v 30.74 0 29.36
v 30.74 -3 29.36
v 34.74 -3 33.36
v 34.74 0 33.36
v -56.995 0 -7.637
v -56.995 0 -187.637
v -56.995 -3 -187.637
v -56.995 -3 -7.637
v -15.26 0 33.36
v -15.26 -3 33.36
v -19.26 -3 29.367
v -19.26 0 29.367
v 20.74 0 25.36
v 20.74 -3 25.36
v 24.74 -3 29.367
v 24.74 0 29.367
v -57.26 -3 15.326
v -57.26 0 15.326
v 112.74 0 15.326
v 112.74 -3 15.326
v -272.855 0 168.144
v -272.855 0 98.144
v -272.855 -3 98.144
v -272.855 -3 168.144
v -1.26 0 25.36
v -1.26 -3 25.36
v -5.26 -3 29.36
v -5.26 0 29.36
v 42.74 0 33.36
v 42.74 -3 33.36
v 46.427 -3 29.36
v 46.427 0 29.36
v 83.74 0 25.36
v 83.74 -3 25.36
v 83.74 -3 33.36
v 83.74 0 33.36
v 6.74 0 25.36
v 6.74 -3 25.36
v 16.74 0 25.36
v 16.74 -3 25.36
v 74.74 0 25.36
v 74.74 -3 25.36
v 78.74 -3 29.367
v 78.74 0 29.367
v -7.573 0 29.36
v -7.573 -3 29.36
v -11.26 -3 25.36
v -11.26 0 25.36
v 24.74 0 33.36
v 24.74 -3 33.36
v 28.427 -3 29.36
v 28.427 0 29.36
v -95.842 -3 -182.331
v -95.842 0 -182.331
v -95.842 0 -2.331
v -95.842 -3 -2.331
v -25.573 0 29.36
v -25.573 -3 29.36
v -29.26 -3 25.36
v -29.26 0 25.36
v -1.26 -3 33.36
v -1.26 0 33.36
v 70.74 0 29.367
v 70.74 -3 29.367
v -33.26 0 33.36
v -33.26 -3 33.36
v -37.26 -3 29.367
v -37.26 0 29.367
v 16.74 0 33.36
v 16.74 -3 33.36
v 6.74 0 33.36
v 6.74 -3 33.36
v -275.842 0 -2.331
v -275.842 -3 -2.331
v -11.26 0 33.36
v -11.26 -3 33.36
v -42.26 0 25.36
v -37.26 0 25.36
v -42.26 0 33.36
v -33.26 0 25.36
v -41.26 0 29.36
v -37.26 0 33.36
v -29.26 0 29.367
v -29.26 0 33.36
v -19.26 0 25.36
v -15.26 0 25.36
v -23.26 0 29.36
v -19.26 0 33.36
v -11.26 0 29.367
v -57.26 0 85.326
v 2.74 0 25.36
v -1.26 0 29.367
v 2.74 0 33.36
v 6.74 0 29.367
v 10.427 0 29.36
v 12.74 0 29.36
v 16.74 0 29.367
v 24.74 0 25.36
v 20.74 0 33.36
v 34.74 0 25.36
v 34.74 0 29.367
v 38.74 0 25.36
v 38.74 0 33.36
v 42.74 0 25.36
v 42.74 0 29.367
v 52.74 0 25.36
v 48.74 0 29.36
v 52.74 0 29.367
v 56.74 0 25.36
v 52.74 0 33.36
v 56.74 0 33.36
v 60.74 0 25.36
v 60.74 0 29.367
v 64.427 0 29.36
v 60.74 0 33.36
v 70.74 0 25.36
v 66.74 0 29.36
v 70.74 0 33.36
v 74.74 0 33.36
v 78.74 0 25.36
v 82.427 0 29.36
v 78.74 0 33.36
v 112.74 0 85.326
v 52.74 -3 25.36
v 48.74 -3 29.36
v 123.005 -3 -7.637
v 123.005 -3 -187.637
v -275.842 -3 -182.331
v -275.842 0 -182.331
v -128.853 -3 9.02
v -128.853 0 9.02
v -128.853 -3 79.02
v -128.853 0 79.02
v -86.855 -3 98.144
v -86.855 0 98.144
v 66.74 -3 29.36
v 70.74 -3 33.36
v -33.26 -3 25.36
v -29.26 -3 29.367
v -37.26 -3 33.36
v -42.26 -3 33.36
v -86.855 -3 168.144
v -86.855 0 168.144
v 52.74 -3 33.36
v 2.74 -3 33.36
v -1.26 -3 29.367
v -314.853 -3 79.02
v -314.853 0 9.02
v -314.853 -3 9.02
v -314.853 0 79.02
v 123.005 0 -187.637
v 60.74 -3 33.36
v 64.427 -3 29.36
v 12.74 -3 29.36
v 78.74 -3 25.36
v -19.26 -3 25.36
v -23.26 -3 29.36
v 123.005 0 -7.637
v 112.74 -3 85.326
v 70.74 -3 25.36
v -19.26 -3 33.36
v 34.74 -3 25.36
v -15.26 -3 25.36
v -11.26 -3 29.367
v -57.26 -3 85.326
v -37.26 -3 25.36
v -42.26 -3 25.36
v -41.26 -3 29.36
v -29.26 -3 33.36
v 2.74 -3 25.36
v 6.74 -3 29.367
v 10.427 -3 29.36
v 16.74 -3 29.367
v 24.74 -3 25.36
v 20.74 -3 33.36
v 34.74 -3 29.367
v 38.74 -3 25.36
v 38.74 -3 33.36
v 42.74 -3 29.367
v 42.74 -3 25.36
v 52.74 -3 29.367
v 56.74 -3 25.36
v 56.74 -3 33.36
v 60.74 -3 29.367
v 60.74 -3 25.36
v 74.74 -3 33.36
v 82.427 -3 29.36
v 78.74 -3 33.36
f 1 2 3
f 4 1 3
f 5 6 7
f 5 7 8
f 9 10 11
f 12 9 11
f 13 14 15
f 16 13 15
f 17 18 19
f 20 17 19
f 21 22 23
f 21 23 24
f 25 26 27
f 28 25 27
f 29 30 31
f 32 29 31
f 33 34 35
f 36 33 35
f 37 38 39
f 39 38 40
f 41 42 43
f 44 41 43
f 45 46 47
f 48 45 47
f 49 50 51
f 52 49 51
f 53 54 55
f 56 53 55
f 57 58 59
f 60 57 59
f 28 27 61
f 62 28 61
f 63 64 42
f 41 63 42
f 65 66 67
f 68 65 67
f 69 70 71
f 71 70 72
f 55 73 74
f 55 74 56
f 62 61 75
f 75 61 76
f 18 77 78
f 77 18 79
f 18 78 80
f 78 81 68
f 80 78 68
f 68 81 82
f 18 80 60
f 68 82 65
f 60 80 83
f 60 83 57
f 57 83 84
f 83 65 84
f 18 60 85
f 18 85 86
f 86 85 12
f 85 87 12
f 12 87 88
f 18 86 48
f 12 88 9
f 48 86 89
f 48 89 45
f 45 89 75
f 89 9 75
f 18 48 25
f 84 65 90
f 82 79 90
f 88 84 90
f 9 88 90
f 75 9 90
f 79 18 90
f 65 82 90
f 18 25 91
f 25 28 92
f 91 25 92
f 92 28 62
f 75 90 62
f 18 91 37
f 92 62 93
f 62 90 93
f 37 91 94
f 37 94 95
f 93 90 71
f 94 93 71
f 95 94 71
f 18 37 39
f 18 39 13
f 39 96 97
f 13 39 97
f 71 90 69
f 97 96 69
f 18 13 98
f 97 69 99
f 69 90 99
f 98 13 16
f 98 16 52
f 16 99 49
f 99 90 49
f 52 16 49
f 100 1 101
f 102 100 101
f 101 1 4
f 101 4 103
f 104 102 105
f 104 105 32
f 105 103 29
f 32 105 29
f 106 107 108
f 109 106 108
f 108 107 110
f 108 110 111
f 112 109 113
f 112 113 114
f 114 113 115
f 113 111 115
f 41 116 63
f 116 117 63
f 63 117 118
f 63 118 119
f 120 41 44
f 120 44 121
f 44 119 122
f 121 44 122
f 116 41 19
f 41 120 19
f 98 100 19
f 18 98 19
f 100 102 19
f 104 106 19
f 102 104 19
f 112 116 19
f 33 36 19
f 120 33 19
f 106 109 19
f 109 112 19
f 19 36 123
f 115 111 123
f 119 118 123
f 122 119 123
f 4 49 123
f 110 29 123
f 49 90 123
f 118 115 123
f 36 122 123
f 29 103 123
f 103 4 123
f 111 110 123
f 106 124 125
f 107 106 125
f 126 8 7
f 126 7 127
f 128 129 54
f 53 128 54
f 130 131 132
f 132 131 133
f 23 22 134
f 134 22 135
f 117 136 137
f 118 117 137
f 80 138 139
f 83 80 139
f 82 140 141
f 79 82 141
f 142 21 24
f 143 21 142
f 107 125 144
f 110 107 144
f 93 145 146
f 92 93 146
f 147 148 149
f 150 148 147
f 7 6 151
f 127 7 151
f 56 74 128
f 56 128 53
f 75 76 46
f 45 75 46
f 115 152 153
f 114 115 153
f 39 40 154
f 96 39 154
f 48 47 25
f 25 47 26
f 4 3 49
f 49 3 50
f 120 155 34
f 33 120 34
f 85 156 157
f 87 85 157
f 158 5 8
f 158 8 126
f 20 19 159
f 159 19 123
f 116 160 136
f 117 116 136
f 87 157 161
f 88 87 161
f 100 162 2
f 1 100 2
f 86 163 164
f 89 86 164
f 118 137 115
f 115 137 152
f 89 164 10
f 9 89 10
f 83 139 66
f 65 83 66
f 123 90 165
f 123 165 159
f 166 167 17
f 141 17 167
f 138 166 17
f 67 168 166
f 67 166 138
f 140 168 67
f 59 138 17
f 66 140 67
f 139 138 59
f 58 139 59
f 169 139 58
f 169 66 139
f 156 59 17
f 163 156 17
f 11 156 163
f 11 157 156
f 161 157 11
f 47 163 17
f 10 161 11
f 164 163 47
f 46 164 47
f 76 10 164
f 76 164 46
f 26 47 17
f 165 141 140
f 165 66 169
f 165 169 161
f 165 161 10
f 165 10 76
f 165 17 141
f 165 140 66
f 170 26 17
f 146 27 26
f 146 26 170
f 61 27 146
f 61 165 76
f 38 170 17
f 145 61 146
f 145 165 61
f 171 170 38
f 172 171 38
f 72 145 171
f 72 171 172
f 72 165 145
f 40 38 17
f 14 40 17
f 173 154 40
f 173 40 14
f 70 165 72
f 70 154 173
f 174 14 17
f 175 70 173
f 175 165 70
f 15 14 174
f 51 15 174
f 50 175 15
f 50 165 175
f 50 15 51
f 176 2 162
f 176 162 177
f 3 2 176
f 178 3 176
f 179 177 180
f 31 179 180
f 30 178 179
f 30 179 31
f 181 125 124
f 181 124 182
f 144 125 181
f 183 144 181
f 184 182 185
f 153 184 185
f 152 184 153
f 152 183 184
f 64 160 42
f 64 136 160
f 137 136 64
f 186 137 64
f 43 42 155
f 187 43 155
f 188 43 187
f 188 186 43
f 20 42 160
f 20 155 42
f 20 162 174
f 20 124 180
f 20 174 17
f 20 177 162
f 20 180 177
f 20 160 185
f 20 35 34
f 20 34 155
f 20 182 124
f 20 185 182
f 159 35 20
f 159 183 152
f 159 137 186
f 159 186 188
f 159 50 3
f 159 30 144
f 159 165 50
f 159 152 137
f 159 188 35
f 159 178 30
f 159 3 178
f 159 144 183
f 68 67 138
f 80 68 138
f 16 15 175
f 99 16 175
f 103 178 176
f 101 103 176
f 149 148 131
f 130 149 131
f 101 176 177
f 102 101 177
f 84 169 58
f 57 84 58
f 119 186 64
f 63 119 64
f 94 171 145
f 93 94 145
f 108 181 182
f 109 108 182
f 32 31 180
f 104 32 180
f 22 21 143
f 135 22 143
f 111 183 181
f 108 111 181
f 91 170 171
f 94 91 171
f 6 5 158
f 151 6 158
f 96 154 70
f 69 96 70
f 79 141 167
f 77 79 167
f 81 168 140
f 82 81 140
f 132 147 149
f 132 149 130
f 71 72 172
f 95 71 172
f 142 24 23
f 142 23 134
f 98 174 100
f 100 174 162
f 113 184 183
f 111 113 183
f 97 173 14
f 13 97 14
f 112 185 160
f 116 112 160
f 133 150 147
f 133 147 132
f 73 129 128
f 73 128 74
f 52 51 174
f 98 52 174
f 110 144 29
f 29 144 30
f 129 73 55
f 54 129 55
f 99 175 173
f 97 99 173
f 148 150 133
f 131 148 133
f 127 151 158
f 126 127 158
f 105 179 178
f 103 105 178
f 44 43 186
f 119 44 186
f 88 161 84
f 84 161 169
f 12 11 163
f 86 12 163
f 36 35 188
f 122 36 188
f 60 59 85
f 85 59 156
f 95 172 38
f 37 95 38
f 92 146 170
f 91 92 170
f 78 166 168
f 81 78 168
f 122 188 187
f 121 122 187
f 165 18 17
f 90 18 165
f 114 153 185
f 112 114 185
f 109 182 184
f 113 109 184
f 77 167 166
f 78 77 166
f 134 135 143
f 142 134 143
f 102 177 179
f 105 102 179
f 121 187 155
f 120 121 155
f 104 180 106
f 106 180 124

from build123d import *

# Parameters (mm, degrees)
F0_W      = 170
F0_H      = 70
F1_DEPTH  = 3
F3_DEPTH  = 25
F4_W      = 186
F4_H      = 70
F5_DEPTH  = 3
F6_W      = 180
F6_H      = 180
F7_DEPTH  = 3
F8_W      = 186
F8_H      = 70
F9_DEPTH  = 3
F10_W     = 180
F10_H     = 180
F11_DEPTH = 3


# Not quite as in the source:
# - a feature names something its author has since deleted; it is built from what else it names


with BuildPart() as f1:
    # F0 (on Front) → F1 (new body)
    with BuildSketch(Plane.XZ):
        with Locations((27.7395422168, 50.3261041269)):
            Rectangle(F0_W, F0_H)
    extrude(amount=F1_DEPTH)

    # F2 (on face) → F3 (cut)
    with BuildSketch(Plane.XZ.offset(3)):
        Polygon((-42.2604577832, 33.3604037393), (-42.2604577832, 25.3604037393), (-37.2604577832, 25.3604037393), (-41.2604577832, 29.3604037393), (-37.2604577832, 33.3604037393), align=None)
        Polygon((-37.2604524818, 29.366916148), (-33.2604577832, 25.3604037393), (-29.2604630847, 29.366916148), (-33.2604577832, 33.3604037393), align=None)
        Polygon((-25.5732325301, 29.3604037393), (-29.2604577832, 25.3604037393), (-24.2604577832, 25.3604037393), (-24.2604577832, 33.3604037393), (-29.2604577832, 33.3604037393), align=None)
        Polygon((-24.2604577832, 33.3604037393), (-24.2604577832, 25.3604037393), (-19.2604577832, 25.3604037393), (-23.2604577832, 29.3604037393), (-19.2604577832, 33.3604037393), align=None)
        Polygon((-11.2604630847, 29.366916148), (-15.2604577832, 33.3604037393), (-19.2604524818, 29.366916148), (-15.2604577832, 25.3604037393), align=None)
        Polygon((-7.5732325301, 29.3604037393), (-11.2604577832, 25.3604037393), (-6.2604577832, 25.3604037393), (-6.2604577832, 33.3604037393), (-11.2604577832, 33.3604037393), align=None)
        Polygon((-6.2604577832, 33.3604037393), (-6.2604577832, 25.3604037393), (-1.2604577832, 25.3604037393), (-5.2604577832, 29.3604037393), (-1.2604577832, 33.3604037393), align=None)
        Polygon((6.7395369153, 29.366916148), (2.7395422168, 33.3604037393), (-1.2604524818, 29.366916148), (2.7395422168, 25.3604037393), align=None)
        Polygon((10.4267674699, 29.3604037393), (6.7395422168, 25.3604037393), (11.7395422168, 25.3604037393), (11.7395422168, 33.3604037393), (6.7395422168, 33.3604037393), align=None)
        Polygon((11.7395422168, 33.3604037393), (11.7395422168, 25.3604037393), (16.7395422168, 25.3604037393), (12.7395422168, 29.3604037393), (16.7395422168, 33.3604037393), align=None)
        Polygon((24.7395369153, 29.366916148), (20.7395422168, 33.3604037393), (16.7395475182, 29.366916148), (20.7395422168, 25.3604037393), align=None)
        Polygon((28.4267674699, 29.3604037393), (24.7395422168, 25.3604037393), (29.7395422168, 25.3604037393), (29.7395422168, 33.3604037393), (24.7395422168, 33.3604037393), align=None)
        Polygon((29.7395422168, 33.3604037393), (29.7395422168, 25.3604037393), (34.7395422168, 25.3604037393), (30.7395422168, 29.3604037393), (34.7395422168, 33.3604037393), align=None)
        Polygon((42.7395369153, 29.366916148), (38.7395422168, 33.3604037393), (34.7395475182, 29.366916148), (38.7395422168, 25.3604037393), align=None)
        Polygon((46.4267674699, 29.3604037393), (42.7395422168, 25.3604037393), (47.7395422168, 25.3604037393), (47.7395422168, 33.3604037393), (42.7395422168, 33.3604037393), align=None)
        Polygon((47.7395422168, 33.3604037393), (47.7395422168, 25.3604037393), (52.7395422168, 25.3604037393), (48.7395422168, 29.3604037393), (52.7395422168, 33.3604037393), align=None)
        Polygon((60.7395369153, 29.366916148), (56.7395422168, 33.3604037393), (52.7395475182, 29.366916148), (56.7395422168, 25.3604037393), align=None)
        Polygon((64.4267674699, 29.3604037393), (60.7395422168, 25.3604037393), (65.7395422168, 25.3604037393), (65.7395422168, 33.3604037393), (60.7395422168, 33.3604037393), align=None)
        Polygon((65.7395422168, 33.3604037393), (65.7395422168, 25.3604037393), (70.7395422168, 25.3604037393), (66.7395422168, 29.3604037393), (70.7395422168, 33.3604037393), align=None)
        Polygon((78.7395369153, 29.366916148), (74.7395422168, 33.3604037393), (70.7395475182, 29.366916148), (74.7395422168, 25.3604037393), align=None)
        Polygon((82.4267674699, 29.3604037393), (78.7395422168, 25.3604037393), (83.7395422168, 25.3604037393), (83.7395422168, 33.3604037393), (78.7395422168, 33.3604037393), align=None)
    extrude(amount=-F3_DEPTH, mode=Mode.SUBTRACT)


with BuildPart() as f5:
    # F4 (on Front) → F5 (new body)
    with BuildSketch(Plane.XZ):
        with Locations((-221.8526970997, 44.0200128766)):
            Rectangle(F4_W, F4_H)
    extrude(amount=F5_DEPTH)


with BuildPart() as f7:
    # F6 (on Front) → F7 (new body)
    with BuildSketch(Plane.XZ):
        with Locations((33.0046193302, -97.6369565725)):
            Rectangle(F6_W, F6_H)
    extrude(amount=F7_DEPTH)


with BuildPart() as f9:
    # F8 (on Front) → F9 (new body)
    with BuildSketch(Plane.XZ):
        with Locations((-179.8553494937, 133.1439353526)):
            Rectangle(F8_W, F8_H)
    extrude(amount=F9_DEPTH)


with BuildPart() as f11:
    # F10 (on Front) → F11 (new body)
    with BuildSketch(Plane.XZ):
        with Locations((-185.8420636411, -92.3306977749)):
            Rectangle(F10_W, F10_H)
    extrude(amount=F11_DEPTH)


solid = Compound([f1.part, f5.part, f7.part, f9.part, f11.part])
